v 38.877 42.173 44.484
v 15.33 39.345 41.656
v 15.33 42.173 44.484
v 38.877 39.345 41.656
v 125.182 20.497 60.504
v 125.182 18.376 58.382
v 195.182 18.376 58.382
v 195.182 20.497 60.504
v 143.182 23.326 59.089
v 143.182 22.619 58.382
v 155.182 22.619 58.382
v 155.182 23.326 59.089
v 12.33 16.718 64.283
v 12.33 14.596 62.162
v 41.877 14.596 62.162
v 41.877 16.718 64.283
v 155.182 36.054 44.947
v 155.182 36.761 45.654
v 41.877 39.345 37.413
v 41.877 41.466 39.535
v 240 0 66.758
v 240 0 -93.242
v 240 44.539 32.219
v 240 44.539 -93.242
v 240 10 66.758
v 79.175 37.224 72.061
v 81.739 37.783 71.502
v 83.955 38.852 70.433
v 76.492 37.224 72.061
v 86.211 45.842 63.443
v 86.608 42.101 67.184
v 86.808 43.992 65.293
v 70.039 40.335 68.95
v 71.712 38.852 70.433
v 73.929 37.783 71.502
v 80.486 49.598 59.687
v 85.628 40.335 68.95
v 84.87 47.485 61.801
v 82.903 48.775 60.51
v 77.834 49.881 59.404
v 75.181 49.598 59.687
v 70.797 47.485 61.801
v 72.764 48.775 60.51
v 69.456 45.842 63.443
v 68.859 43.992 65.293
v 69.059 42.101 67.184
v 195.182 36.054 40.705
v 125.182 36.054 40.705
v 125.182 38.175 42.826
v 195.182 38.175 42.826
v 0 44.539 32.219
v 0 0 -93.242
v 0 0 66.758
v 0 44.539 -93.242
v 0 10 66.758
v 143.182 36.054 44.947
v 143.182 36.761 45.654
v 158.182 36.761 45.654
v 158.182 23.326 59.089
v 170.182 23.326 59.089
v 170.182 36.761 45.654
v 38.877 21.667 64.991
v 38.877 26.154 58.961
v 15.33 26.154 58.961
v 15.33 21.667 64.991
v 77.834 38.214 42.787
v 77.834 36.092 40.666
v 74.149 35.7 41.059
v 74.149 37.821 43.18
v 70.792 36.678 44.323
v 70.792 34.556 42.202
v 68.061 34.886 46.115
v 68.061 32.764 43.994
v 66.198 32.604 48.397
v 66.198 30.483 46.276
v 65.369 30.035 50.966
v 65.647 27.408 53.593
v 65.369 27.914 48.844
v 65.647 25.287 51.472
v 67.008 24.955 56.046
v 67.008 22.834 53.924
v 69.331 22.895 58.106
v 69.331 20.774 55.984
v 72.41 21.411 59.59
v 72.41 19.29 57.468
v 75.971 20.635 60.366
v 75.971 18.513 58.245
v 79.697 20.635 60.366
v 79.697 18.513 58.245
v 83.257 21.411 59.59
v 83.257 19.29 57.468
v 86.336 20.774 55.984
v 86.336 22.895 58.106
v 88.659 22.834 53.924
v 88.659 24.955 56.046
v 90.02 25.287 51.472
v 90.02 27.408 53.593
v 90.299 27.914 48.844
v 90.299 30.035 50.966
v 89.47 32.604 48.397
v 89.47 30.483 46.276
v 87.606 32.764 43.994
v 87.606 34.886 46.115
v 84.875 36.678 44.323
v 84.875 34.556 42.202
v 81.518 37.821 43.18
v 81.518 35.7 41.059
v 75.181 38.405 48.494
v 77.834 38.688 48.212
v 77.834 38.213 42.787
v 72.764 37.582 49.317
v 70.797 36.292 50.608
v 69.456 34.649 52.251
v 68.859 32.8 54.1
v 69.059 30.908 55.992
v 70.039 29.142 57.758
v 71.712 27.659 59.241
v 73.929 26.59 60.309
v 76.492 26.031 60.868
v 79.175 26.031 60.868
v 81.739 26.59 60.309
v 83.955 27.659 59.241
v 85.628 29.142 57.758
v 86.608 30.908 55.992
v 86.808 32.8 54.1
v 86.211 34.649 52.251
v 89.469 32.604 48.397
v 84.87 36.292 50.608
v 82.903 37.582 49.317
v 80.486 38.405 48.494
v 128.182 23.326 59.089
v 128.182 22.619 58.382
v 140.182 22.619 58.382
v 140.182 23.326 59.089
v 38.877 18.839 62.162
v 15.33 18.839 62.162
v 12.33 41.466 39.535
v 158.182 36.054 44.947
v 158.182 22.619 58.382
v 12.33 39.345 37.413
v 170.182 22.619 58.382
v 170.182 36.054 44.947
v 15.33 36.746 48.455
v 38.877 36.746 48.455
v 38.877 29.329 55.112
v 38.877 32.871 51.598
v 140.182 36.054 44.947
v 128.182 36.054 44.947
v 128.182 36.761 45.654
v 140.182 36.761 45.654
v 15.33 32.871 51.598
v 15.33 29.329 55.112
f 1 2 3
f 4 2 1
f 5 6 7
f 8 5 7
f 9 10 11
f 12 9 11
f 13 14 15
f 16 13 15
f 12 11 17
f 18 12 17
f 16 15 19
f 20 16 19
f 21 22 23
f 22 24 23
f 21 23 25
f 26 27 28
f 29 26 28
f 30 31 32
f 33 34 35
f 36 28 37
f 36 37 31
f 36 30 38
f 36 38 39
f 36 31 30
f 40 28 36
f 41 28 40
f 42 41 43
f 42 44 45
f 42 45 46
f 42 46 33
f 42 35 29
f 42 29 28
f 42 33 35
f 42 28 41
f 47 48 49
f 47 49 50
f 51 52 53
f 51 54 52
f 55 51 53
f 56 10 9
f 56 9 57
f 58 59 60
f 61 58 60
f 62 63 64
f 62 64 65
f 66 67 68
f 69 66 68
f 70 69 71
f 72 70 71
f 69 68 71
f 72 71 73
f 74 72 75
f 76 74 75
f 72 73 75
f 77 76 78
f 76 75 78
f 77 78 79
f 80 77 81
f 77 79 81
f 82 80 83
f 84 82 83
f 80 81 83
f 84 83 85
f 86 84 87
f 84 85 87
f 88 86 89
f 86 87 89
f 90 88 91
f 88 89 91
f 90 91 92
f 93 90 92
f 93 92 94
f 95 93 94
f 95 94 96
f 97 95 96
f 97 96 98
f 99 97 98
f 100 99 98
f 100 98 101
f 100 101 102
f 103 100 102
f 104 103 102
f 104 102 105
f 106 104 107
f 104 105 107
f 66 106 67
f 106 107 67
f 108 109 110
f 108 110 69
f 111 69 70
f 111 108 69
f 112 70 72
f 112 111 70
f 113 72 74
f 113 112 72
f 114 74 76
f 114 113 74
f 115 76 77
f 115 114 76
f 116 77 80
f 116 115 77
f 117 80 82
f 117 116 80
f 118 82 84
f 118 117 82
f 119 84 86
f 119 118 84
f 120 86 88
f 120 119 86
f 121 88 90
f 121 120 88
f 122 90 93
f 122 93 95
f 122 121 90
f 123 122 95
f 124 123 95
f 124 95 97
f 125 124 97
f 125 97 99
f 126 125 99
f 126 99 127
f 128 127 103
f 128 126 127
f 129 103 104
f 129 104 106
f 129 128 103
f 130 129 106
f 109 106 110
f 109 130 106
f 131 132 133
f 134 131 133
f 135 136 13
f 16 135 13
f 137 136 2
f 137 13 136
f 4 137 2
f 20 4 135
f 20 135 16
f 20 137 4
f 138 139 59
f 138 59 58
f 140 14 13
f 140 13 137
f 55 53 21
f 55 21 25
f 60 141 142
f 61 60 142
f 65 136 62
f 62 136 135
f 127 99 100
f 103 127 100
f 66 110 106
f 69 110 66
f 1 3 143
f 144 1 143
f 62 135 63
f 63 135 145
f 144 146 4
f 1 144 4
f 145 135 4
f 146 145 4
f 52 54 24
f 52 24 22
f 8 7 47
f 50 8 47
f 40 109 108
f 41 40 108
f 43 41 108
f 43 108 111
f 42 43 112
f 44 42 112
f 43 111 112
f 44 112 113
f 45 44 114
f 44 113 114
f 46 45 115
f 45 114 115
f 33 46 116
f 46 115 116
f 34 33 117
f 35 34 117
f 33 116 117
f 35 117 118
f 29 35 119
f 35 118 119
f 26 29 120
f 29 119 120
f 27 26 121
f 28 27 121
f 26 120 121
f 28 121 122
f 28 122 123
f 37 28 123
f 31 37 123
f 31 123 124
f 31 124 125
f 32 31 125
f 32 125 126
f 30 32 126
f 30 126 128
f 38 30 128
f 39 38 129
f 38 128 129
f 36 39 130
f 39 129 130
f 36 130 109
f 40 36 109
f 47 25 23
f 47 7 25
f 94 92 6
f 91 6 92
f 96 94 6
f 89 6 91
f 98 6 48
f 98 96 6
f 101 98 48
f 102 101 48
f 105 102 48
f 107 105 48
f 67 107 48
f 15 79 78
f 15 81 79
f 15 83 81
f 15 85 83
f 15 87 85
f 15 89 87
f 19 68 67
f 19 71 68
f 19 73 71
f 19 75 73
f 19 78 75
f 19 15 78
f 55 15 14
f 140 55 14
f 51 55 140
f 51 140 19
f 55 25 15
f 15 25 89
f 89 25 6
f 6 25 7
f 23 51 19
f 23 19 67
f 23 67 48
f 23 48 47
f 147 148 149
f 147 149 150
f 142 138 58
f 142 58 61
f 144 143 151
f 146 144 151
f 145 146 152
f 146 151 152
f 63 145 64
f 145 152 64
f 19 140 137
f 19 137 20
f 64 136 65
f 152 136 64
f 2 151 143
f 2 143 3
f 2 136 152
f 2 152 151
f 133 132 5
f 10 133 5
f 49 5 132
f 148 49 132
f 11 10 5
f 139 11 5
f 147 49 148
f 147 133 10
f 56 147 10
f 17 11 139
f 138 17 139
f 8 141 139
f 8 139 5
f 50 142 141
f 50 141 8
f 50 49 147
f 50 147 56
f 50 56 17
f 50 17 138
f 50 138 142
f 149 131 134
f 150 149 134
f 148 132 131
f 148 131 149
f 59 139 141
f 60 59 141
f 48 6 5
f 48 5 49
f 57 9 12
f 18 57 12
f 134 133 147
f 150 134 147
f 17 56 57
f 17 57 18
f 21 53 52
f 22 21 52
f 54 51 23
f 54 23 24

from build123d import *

# Parameters (mm, degrees)
BOSS_EXTRUDE1_DEPTH = 240
SKETCH2_W           = 70
SKETCH2_H           = 25
SKETCH2_W_2         = 29.546106777
SKETCH2_H_2         = 35
SKETCH2_R           = 12.5
BOSS_EXTRUDE2_DEPTH = 3
SKETCH3_R           = 9
BOSS_EXTRUDE3_DEPTH = 20
CHAMFER1_SIZE2      = 4.171137574
CHAMFER1_SIZE       = 3.5
SKETCH4_W           = 23.546106777
SKETCH4_H           = 29
BOSS_EXTRUDE4_DEPTH = 4
CUT_EXTRUDE1_DEPTH  = 27
SKETCH6_W           = 12
SKETCH6_H           = 19
BOSS_EXTRUDE5_DEPTH = 1


with BuildPart() as part:
    # Sketch1 → Boss-Extrude1 (new body)
    with BuildSketch(Plane(origin=(0, 0, 0), x_dir=(0, 0, -1), z_dir=(1, 0, 0))):
        Polygon((0, 0), (-66.758331831, 0), (-66.758331831, 10), (-32.219272119, 44.539059712), (93.241668169, 44.539059712), (93.241668169, 0), align=None)
    extrude(amount=BOSS_EXTRUDE1_DEPTH)

    # Sketch2 → Boss-Extrude2 (add)
    with BuildSketch(Plane(origin=(0, 38.379165915, 38.379165915), x_dir=(1, 0, 0), z_dir=(0, 0.7071067811865298, 0.7071067811865652))):
        with Locations((160.181803508, -15.788594651)):
            Rectangle(SKETCH2_W, SKETCH2_H)
        with Locations((27.103479103, -16.134201326)):
            Rectangle(SKETCH2_W_2, SKETCH2_H_2)
        with Locations(Location((77.833586966, -15.734201326, 0), (0, 0, 90))):
            Circle(SKETCH2_R)
    extrude(amount=BOSS_EXTRUDE2_DEPTH)

    # Sketch3 → Boss-Extrude3 (add)
    with BuildSketch(Plane(origin=(0, 40.500486259, 40.500486259), x_dir=(1, 0, 0), z_dir=(0, 0.7071067811865298, 0.7071067811865652))):
        with Locations(Location((77.833586966, -15.734201326, 0), (0, 0, 90))):
            Circle(SKETCH3_R)
    extrude(amount=BOSS_EXTRUDE3_DEPTH)

    # Chamfer1
    chamfer1_edges = [part.edges().sort_by_distance(p)[0] for p in [
        (77.833586966, 23.010764774, 57.990207744),
    ]]
    chamfer1_side = [part.faces().sort_by_distance(p)[0] for p in [
        (77.833586966, 22.961267299, 58.039705219),
    ]]
    chamfer(chamfer1_edges, length=CHAMFER1_SIZE - 0.0001, length2=CHAMFER1_SIZE2 - 0.0001, reference=chamfer1_side[0])  # a hair under: the kernel refuses the full size

    # Sketch4 → Boss-Extrude4 (add)
    with BuildSketch(Plane(origin=(0, 40.500486259, 40.500486259), x_dir=(1, 0, 0), z_dir=(0, 0.7071067811865298, 0.7071067811865652))):
        with Locations((27.103479102, -16.134201326)):
            Rectangle(SKETCH4_W, SKETCH4_H)
    extrude(amount=BOSS_EXTRUDE4_DEPTH)

    # Sketch5 → Cut-Extrude1 (cut)
    with BuildSketch(Plane.ZY.offset(-15.330425714)):
        with BuildLine():
            Line((44.484468223, 42.173358544), (48.455235169, 36.745535854))
            ThreePointArc((48.455235169, 36.745535854), (53.310708919, 31.055931968), (58.960608868, 26.154315063))
            Line((58.960608868, 26.154315063), (64.990564878, 21.66726189))
            Line((64.990564878, 21.66726189), (44.484468223, 42.173358544))
        make_face()
    extrude(amount=-CUT_EXTRUDE1_DEPTH, mode=Mode.SUBTRACT)

    # Sketch6 → Boss-Extrude5 (add)
    with BuildSketch(Plane(origin=(0, 40.500486259, 40.500486259), x_dir=(1, 0, 0), z_dir=(0, 0.7071067811865298, 0.7071067811865652))):
        with Locations((134.181803508, -15.788594651)):
            Rectangle(SKETCH6_W, SKETCH6_H)
        with Locations((149.181803508, -15.788594651)):
            Rectangle(SKETCH6_W, SKETCH6_H)
        with Locations((164.181803508, -15.788594651)):
            Rectangle(SKETCH6_W, SKETCH6_H)
    extrude(amount=BOSS_EXTRUDE5_DEPTH)


solid = part.part
